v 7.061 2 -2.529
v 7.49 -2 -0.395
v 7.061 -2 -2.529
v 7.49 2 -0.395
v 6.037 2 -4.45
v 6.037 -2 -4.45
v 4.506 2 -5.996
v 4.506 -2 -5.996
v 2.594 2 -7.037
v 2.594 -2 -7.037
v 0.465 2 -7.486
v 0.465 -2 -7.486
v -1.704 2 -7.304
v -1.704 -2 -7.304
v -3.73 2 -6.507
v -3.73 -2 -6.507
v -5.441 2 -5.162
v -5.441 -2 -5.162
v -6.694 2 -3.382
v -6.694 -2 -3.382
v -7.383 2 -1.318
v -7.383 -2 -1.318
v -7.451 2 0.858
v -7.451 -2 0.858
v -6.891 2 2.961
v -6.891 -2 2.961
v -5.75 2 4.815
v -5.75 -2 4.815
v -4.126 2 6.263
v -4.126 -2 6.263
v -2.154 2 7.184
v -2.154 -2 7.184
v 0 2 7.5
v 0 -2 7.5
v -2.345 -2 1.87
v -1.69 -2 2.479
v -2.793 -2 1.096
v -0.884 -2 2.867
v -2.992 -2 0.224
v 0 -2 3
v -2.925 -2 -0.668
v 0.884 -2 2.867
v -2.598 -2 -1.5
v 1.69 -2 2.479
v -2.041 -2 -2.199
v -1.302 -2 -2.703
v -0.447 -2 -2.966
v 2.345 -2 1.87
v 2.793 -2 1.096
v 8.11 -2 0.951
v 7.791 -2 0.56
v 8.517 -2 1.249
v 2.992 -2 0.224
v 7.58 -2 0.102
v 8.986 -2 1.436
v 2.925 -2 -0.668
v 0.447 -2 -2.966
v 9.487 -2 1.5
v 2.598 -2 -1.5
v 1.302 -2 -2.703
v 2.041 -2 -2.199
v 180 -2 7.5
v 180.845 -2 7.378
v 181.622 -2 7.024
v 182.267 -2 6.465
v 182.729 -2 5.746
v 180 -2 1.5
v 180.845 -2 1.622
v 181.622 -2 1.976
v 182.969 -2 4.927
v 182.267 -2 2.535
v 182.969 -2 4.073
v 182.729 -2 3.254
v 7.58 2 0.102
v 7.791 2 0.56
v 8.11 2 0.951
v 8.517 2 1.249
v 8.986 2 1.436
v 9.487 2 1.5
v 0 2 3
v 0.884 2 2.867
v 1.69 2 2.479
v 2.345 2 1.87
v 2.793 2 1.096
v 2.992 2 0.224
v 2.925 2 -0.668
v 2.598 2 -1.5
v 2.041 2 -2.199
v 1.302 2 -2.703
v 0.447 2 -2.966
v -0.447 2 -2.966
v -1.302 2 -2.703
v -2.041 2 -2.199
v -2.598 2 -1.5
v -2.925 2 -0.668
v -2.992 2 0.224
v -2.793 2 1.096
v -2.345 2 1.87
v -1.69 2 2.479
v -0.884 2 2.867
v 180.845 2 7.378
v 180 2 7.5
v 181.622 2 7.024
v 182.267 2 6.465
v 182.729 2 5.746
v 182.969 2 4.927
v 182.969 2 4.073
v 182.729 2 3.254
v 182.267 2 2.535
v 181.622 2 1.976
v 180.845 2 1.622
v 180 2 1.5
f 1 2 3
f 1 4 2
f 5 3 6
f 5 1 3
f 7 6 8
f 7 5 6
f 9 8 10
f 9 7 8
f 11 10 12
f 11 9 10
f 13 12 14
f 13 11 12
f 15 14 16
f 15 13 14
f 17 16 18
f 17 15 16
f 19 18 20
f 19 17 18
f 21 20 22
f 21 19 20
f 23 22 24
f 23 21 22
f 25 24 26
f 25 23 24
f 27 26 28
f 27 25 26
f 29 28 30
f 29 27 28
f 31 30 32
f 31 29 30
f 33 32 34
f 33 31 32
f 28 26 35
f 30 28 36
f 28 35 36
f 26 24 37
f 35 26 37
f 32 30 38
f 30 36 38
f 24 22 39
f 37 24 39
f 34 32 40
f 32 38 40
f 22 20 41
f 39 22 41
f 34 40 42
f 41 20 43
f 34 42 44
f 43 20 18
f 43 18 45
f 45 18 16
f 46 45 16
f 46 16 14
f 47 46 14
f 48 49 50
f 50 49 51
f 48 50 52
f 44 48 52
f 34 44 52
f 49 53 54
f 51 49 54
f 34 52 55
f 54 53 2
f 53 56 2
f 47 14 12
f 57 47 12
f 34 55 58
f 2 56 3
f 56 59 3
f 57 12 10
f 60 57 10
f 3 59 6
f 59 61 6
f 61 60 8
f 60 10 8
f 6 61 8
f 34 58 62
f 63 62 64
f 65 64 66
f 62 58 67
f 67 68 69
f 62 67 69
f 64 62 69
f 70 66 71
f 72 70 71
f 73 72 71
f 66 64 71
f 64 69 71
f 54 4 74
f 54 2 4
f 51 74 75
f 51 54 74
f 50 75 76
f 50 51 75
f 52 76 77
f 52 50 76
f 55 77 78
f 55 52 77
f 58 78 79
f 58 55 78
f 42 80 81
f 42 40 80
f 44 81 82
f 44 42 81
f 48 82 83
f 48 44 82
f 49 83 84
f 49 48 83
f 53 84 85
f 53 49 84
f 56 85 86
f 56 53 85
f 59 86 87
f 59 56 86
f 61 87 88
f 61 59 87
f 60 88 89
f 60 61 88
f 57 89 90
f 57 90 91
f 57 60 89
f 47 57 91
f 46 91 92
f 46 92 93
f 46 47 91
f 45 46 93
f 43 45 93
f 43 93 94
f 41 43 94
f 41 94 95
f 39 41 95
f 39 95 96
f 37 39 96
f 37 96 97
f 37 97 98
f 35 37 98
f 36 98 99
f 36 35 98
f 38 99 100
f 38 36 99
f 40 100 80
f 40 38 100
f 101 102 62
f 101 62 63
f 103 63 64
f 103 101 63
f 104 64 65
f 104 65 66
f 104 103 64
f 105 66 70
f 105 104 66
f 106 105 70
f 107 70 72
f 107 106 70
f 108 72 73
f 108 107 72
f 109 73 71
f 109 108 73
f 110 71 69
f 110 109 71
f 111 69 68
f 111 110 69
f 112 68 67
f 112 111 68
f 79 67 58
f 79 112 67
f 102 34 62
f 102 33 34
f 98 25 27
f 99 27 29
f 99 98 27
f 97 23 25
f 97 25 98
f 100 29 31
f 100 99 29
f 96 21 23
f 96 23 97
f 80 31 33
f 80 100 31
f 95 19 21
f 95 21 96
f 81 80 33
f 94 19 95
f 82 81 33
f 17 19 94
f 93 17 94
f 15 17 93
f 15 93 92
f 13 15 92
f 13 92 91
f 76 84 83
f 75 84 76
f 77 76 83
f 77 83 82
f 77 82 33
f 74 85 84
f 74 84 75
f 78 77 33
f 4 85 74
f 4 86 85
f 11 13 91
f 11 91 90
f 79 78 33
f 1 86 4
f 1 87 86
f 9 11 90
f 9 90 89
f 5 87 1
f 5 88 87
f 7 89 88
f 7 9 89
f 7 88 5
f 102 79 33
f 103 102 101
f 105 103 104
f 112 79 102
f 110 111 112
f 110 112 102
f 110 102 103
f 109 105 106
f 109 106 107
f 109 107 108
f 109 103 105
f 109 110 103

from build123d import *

# Parameters (mm, degrees)
SKETCH1_R           = 3
BOSS_EXTRUDE1_DEPTH = 2
FILLET1_R           = 2


with BuildPart() as part:
    # Sketch1 → Boss-Extrude1 (new, symmetric)
    with BuildSketch(Plane(origin=(0, 0, 0), x_dir=(1, 0, 0), z_dir=(0, 1, 0))):
        with BuildLine():
            Line((0, -7.5), (180, -7.5))
            ThreePointArc((180, -7.5), (183, -4.5), (180, -1.5))
            Line((180, -1.5), (7.348469228, -1.5))
            ThreePointArc((7.348469228, -1.5), (-4.74341649, 5.809475019), (0, -7.5))
        make_face()
        with Locations(Location((0, 0, 0), (0, 0, 270))):
            Circle(SKETCH1_R, mode=Mode.SUBTRACT)
    extrude(amount=BOSS_EXTRUDE1_DEPTH, both=True)

    # Fillet1
    fillet1_edges = [part.edges().sort_by_distance(p)[0] for p in [
        (7.348469228, 0, 1.5),
    ]]
    fillet(fillet1_edges, radius=FILLET1_R)


solid = part.part
